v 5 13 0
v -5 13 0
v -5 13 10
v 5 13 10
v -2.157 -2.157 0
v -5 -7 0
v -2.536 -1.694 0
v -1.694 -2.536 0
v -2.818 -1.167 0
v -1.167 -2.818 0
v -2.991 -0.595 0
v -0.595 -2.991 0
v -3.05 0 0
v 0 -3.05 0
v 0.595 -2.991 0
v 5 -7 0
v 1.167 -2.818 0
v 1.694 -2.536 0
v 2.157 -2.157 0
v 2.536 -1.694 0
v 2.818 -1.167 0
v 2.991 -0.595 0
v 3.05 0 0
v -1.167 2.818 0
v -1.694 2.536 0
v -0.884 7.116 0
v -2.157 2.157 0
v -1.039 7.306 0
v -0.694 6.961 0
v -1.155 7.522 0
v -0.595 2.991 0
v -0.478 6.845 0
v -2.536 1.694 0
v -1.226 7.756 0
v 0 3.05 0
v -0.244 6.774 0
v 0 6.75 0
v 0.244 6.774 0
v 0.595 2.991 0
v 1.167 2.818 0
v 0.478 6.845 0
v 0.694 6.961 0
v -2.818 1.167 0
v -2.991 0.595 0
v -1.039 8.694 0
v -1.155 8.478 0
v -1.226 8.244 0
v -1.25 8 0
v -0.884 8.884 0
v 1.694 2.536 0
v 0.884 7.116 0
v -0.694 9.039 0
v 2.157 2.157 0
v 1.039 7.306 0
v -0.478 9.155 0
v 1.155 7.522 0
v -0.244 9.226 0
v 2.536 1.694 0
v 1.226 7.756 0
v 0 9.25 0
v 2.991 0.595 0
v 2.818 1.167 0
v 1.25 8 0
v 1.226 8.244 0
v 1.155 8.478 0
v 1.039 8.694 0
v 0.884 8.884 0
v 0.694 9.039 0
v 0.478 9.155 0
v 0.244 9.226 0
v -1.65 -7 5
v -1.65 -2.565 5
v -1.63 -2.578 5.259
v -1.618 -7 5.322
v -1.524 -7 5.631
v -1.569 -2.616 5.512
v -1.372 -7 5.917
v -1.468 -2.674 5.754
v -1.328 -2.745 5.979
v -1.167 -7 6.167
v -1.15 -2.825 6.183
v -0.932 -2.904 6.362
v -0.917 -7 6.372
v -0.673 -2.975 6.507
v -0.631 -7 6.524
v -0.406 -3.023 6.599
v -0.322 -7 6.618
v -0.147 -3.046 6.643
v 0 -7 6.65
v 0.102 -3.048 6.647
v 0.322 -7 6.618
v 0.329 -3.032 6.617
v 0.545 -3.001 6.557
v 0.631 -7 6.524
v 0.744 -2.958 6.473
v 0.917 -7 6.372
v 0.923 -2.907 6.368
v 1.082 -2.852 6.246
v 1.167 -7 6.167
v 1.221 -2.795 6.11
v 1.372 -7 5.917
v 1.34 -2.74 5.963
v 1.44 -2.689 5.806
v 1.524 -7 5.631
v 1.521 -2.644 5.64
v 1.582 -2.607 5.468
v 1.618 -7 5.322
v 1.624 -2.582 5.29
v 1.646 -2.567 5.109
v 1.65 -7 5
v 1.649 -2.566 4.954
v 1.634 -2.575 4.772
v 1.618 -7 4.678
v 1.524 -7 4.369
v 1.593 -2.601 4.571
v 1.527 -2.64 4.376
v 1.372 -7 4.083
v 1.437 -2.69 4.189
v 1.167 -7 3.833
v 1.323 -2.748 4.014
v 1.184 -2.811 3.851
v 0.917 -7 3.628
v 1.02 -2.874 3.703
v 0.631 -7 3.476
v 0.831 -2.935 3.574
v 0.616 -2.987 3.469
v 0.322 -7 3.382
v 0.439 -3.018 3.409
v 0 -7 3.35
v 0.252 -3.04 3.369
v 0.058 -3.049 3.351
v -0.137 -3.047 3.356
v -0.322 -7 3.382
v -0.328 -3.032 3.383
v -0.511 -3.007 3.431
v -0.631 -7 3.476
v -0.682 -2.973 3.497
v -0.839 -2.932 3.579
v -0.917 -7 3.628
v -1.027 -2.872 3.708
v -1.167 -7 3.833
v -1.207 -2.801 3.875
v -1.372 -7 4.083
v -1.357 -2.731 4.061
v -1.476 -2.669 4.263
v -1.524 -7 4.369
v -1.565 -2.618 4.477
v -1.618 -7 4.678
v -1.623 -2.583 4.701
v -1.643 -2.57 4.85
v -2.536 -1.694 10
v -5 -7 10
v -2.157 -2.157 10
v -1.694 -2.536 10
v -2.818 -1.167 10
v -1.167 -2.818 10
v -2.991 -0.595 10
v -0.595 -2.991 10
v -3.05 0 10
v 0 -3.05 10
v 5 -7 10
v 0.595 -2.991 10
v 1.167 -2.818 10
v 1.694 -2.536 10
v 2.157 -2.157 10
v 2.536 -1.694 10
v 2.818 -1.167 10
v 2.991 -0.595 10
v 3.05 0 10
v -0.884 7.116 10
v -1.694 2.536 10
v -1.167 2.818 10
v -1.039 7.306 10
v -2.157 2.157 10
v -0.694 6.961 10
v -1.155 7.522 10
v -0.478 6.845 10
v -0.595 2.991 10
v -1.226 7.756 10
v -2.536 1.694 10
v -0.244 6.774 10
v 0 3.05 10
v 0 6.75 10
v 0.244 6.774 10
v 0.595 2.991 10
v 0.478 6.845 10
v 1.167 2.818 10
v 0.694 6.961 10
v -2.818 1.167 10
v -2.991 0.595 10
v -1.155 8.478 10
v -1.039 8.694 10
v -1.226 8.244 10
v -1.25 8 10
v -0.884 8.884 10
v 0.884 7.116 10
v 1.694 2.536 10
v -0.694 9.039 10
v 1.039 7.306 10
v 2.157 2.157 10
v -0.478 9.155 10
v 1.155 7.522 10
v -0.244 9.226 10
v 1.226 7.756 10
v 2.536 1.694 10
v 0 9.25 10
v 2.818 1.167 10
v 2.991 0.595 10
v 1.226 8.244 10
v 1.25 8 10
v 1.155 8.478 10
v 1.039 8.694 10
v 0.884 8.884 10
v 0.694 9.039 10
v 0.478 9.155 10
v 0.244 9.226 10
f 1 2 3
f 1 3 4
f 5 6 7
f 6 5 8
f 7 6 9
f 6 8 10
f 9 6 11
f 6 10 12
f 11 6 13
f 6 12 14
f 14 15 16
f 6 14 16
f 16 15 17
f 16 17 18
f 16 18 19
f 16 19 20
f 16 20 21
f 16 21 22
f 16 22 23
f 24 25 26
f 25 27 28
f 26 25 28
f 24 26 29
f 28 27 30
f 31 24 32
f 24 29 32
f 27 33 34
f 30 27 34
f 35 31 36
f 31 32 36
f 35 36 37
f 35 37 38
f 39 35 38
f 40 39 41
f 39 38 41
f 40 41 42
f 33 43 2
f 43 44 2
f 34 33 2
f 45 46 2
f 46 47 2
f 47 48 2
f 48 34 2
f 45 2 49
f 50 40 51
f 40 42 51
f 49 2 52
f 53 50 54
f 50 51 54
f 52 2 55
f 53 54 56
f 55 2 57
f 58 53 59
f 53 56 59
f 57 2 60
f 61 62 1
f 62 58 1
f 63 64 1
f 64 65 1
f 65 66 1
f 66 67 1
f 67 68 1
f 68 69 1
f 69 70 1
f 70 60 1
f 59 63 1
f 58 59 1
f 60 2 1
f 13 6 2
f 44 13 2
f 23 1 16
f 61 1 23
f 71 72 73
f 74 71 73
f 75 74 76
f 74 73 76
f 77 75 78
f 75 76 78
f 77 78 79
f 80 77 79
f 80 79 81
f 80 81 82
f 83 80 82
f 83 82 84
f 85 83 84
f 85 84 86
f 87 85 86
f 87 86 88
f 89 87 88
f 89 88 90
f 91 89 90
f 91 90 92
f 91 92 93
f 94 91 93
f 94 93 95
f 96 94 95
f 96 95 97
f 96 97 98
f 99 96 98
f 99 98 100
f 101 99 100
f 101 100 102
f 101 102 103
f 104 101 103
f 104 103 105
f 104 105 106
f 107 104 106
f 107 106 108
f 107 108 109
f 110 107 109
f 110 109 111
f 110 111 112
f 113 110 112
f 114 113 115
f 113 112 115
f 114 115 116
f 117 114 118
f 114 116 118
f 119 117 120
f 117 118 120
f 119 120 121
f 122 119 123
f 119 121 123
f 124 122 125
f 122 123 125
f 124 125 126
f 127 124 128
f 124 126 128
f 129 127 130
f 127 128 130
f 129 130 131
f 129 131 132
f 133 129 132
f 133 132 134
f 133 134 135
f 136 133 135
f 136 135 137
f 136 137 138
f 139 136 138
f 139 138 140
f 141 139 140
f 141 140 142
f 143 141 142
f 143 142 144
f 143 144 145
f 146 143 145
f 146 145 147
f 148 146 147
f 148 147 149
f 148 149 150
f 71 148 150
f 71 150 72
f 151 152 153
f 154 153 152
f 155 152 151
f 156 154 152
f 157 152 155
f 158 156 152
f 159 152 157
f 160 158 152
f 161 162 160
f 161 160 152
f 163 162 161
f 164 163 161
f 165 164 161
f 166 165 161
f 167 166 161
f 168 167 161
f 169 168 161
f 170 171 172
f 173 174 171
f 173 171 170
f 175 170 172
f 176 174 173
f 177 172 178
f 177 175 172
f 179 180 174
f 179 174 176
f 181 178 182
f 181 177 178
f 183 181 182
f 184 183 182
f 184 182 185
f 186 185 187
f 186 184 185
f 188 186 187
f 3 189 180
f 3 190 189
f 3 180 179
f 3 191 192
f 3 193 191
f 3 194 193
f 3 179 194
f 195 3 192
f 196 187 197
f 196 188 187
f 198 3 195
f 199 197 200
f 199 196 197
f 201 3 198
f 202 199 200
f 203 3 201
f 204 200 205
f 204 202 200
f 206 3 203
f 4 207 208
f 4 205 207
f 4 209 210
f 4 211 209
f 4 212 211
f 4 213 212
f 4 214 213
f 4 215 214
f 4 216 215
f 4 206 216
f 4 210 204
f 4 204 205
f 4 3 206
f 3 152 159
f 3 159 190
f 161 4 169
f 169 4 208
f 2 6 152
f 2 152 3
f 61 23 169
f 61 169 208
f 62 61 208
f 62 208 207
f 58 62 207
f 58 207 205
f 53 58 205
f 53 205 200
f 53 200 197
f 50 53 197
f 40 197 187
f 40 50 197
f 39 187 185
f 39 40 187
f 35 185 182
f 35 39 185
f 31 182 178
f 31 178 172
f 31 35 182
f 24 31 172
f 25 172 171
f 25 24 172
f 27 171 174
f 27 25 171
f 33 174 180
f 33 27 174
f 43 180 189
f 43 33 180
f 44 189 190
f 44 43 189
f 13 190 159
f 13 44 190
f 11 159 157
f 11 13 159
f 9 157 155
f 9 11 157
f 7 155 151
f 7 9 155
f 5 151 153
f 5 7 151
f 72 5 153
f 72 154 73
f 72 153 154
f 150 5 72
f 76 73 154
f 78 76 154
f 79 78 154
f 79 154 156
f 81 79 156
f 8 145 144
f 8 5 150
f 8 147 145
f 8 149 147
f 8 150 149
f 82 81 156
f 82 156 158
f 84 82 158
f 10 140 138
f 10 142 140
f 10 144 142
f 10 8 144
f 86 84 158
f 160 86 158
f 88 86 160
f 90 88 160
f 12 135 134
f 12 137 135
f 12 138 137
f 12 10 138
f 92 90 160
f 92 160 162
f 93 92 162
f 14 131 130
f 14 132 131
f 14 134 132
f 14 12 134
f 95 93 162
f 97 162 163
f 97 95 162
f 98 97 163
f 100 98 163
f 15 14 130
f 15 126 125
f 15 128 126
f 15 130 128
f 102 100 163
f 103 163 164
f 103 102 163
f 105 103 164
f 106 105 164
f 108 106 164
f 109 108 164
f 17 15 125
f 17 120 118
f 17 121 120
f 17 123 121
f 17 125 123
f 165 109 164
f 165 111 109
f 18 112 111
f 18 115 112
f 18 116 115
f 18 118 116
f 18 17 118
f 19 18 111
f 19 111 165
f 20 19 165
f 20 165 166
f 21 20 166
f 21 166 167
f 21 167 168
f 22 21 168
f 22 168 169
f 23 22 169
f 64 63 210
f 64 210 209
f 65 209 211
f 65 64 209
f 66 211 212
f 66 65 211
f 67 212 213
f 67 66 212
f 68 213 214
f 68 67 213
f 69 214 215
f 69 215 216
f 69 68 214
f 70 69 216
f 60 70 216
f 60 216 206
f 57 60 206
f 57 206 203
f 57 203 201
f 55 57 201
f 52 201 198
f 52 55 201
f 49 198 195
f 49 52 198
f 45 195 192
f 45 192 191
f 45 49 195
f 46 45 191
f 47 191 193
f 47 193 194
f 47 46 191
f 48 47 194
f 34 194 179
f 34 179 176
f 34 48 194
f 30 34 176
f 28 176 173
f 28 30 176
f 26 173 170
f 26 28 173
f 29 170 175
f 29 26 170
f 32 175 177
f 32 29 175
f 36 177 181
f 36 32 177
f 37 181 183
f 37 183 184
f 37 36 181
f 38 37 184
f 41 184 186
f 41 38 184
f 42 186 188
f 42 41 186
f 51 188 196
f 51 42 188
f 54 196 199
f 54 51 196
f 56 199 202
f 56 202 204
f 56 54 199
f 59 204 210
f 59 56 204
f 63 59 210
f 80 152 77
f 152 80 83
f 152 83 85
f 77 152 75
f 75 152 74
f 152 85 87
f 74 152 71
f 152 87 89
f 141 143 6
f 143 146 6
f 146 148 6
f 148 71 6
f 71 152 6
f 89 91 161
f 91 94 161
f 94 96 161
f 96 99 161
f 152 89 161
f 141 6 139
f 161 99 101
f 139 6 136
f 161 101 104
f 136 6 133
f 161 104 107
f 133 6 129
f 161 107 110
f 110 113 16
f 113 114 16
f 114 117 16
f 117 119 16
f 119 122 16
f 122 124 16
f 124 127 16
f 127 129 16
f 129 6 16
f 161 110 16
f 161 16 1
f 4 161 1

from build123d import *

# Parameters (mm, degrees)
F0_W     = 10
F0_H     = 20
F0_R     = 3.05
F0_R_2   = 1.25
F1_DEPTH = 10
F3_D     = 3.3
F3_DEPTH = 7


with BuildPart() as f1:
    # F0 (on Top) → F1 (new body)
    with BuildSketch(Plane.XY):
        with Locations((0, 3)):
            Rectangle(F0_W, F0_H)
        Circle(F0_R, mode=Mode.SUBTRACT)
        with Locations((0, 8)):
            Circle(F0_R_2, mode=Mode.SUBTRACT)
    extrude(amount=F1_DEPTH)

    # F3
    with Locations(Plane.XZ.offset(7)):
        with Locations((0, 5)):
            Hole(F3_D / 2, depth=F3_DEPTH)


solid = f1.part
